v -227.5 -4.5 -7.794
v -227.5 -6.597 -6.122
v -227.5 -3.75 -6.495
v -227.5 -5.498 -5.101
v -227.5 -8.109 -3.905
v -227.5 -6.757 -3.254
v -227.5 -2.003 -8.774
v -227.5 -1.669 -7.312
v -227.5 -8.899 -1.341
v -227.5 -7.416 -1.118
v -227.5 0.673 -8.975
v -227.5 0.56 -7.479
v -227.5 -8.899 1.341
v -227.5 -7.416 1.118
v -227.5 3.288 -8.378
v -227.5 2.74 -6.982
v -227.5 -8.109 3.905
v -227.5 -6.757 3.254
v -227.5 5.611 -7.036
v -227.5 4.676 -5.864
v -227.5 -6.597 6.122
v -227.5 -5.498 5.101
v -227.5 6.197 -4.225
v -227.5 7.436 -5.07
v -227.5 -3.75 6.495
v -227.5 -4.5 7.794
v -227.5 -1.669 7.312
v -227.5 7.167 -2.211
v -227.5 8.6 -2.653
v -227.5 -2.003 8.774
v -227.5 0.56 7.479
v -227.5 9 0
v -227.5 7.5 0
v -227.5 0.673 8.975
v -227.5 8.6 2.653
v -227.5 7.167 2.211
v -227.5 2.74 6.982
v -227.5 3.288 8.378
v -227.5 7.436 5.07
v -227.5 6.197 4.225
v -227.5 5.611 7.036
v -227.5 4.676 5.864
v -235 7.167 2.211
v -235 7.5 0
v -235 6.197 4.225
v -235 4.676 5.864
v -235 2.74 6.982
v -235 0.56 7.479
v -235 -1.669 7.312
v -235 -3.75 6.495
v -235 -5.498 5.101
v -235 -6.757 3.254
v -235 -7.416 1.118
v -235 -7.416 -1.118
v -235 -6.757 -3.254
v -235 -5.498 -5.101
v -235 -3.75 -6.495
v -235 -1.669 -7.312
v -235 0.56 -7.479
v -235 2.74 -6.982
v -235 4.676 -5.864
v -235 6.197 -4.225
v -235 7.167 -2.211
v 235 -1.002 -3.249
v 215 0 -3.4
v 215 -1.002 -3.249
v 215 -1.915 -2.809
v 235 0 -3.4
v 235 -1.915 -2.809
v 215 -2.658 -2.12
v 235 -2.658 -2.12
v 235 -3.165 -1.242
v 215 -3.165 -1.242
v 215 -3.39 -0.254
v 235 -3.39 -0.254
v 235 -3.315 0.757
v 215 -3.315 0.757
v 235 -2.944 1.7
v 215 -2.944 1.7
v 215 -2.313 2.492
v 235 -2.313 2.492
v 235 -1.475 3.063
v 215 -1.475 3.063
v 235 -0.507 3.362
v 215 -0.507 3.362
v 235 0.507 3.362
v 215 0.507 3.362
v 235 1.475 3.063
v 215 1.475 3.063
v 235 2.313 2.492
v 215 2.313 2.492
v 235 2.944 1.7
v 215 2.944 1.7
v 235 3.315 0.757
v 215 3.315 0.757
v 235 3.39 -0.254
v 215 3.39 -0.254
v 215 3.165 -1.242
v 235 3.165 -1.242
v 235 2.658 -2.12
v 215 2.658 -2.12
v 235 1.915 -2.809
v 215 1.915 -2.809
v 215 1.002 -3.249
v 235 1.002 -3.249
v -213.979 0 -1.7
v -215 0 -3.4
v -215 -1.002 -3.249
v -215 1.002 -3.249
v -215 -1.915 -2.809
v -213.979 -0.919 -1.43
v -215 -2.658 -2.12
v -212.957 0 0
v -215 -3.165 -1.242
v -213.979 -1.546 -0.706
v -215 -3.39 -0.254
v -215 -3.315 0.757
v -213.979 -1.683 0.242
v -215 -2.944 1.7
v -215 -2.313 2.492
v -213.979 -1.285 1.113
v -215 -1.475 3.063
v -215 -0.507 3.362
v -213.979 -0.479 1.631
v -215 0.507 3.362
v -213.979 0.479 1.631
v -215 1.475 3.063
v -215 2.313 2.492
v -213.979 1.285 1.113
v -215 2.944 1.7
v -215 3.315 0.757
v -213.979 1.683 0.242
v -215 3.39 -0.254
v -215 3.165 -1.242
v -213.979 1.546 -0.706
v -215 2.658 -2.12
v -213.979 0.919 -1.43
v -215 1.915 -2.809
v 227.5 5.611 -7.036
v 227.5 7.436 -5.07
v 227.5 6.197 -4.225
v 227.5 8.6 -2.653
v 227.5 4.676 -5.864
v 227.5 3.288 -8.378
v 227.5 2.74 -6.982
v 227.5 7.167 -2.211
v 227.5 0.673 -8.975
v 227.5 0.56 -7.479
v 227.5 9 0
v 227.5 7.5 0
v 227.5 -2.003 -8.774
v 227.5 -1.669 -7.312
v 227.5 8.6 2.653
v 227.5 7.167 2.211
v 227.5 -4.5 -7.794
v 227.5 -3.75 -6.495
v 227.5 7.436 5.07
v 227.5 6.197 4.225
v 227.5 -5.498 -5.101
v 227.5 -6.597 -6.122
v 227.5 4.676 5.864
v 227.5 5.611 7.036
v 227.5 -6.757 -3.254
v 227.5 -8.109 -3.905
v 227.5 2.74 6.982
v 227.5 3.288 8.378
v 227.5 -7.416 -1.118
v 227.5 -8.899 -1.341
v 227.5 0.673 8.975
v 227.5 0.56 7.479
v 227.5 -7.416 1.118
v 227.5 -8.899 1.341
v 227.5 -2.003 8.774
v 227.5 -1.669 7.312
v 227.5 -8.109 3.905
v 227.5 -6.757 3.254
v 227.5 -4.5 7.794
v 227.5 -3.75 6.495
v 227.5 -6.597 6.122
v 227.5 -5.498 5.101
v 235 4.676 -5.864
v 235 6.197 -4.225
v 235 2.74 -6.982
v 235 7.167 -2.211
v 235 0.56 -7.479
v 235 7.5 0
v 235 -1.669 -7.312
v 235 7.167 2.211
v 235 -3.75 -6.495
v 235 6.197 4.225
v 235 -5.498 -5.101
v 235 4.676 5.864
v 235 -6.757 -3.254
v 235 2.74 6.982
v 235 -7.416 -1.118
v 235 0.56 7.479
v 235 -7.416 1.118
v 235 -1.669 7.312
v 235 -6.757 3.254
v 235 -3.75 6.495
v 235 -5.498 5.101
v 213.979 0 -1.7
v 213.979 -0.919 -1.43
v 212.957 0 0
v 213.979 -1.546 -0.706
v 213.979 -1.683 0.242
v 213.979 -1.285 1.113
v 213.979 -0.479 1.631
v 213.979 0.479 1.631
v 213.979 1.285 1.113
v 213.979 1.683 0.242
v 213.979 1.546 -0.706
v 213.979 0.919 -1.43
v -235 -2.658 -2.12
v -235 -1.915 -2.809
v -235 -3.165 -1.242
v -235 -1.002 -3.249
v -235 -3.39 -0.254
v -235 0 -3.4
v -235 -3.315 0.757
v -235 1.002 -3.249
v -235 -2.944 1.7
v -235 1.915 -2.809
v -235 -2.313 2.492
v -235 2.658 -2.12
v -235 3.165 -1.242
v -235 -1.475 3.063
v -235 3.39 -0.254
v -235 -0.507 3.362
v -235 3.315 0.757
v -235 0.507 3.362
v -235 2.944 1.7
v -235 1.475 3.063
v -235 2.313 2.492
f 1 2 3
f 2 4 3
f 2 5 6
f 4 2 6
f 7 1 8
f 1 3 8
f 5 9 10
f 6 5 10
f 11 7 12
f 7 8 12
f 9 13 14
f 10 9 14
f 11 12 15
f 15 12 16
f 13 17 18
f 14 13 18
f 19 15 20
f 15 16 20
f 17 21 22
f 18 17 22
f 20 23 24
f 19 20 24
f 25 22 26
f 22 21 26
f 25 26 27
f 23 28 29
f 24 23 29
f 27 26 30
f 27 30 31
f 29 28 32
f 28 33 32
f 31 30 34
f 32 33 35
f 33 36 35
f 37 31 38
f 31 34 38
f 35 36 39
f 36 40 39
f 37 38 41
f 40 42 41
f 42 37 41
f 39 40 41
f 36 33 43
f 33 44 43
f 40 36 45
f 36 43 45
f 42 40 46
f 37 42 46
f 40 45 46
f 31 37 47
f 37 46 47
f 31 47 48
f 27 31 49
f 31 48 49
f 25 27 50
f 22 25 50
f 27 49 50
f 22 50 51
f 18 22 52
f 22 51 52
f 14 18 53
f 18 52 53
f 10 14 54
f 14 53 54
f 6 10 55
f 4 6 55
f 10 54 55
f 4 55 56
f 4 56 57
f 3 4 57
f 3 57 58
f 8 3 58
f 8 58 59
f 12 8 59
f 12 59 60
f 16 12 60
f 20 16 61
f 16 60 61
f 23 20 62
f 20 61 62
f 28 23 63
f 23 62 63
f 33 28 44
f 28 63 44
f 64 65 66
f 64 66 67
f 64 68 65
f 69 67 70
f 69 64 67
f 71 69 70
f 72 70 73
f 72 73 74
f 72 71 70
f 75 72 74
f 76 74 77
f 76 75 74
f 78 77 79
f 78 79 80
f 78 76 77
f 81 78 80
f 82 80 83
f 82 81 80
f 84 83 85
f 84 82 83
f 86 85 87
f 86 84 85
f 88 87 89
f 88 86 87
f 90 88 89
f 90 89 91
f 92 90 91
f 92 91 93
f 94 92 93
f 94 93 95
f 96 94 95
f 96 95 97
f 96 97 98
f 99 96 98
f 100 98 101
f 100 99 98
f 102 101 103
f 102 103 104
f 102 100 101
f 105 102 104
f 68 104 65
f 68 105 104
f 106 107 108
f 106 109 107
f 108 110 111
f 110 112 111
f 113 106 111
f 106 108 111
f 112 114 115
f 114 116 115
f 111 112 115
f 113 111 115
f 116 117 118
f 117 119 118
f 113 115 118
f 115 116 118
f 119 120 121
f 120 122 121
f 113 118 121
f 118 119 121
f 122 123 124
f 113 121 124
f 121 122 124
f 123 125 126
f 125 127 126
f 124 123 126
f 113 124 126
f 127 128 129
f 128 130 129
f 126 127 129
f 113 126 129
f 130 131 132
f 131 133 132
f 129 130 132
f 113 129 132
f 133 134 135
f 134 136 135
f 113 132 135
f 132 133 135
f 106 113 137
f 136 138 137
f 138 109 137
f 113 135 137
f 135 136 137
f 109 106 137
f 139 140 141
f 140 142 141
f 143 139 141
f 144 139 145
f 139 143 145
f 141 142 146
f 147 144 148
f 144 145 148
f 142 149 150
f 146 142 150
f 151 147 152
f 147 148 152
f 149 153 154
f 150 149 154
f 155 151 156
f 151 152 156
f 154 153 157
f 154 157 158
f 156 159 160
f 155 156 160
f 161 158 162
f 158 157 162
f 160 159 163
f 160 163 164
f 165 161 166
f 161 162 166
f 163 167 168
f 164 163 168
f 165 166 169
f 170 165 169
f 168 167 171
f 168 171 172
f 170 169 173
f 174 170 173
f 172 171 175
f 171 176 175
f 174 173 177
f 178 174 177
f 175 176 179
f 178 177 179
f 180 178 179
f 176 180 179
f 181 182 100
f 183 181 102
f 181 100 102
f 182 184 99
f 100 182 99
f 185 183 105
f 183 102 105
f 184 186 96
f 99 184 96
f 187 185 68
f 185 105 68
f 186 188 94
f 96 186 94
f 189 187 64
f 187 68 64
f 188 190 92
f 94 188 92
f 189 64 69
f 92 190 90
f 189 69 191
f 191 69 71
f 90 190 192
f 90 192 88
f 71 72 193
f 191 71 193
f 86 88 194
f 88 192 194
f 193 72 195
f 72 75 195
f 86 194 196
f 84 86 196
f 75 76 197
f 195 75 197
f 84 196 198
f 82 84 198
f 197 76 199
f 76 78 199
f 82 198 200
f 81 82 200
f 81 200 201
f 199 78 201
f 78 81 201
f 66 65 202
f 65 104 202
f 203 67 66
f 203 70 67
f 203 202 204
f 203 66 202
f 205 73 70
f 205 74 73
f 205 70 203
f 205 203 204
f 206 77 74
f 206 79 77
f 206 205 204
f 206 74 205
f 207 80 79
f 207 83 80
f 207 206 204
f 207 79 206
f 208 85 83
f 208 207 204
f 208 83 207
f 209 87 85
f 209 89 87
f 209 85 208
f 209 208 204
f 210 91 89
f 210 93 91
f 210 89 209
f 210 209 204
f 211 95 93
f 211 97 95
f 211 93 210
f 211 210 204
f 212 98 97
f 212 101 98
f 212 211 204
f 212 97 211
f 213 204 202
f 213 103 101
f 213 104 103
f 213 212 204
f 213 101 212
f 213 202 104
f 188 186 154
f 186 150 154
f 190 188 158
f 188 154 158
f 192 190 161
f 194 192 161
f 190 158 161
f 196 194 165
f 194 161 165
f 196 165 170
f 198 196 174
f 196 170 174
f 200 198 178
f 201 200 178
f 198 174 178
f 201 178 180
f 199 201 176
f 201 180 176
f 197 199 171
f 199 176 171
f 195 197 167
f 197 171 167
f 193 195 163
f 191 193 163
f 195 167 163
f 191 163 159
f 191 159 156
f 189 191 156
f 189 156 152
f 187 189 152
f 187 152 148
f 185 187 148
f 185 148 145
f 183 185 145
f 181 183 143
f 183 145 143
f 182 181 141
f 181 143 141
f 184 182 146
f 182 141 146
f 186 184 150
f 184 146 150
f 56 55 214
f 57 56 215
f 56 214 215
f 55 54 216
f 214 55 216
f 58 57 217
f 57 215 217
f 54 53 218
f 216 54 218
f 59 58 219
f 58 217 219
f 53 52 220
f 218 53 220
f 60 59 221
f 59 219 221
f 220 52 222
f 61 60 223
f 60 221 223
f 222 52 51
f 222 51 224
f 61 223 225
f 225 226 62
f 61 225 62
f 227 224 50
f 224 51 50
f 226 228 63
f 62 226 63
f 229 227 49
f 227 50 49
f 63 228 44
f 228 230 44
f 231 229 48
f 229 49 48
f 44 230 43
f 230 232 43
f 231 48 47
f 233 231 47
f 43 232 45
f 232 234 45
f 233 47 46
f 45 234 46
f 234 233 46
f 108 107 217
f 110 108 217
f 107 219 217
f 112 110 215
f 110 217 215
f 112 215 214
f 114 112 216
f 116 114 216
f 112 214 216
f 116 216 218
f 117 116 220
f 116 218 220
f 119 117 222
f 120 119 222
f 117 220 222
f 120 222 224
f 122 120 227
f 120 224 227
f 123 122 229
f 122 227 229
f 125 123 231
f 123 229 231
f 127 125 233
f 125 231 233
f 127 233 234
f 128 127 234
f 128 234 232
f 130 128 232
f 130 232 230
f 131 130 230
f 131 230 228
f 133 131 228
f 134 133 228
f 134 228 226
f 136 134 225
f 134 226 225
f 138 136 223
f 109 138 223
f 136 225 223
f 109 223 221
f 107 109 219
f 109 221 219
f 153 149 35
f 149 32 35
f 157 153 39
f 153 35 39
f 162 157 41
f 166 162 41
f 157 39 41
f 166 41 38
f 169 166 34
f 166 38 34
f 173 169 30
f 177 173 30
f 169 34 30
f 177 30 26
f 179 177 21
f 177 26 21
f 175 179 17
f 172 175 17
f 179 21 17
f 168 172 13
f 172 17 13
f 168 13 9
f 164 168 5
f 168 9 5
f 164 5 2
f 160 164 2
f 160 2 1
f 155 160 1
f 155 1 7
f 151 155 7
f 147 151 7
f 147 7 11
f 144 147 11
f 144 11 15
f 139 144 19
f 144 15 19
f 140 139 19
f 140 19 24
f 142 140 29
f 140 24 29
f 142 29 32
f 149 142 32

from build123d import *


with BuildPart() as part:
    # Çizim1 → Döndür1 (revolve)
    with BuildSketch(Plane.XY):
        Polygon((-235, 0), (235, 0), (235, 7.5), (227.5, 7.5), (227.5, 9), (-227.5, 9), (-227.5, 7.5), (-235, 7.5), align=None)
    revolve(axis=Axis((-235, 0, 0), (1, 0, 0)))

    # Çizim3 → M8 Dişli Delik1 (revolve, cut)
    with BuildSketch(Plane(origin=(235, 0, 0), x_dir=(0, 0, -1), z_dir=(0, 1, 0))):
        Polygon((0, 0), (0, 22.042926105), (3.4, 20), (3.4, 0), align=None)
    m8_di_li_delik1 = revolve(axis=Axis((241.35, 0, 0), (-1, 0, 0)), mode=Mode.SUBTRACT)

    # Aynalama1: M8 Dişli Delik1 across plane
    add(m8_di_li_delik1.mirror(Plane(origin=(0, 0, 0), x_dir=(0, 0, 1), z_dir=(1, 0, 0))), mode=Mode.SUBTRACT)


solid = part.part
